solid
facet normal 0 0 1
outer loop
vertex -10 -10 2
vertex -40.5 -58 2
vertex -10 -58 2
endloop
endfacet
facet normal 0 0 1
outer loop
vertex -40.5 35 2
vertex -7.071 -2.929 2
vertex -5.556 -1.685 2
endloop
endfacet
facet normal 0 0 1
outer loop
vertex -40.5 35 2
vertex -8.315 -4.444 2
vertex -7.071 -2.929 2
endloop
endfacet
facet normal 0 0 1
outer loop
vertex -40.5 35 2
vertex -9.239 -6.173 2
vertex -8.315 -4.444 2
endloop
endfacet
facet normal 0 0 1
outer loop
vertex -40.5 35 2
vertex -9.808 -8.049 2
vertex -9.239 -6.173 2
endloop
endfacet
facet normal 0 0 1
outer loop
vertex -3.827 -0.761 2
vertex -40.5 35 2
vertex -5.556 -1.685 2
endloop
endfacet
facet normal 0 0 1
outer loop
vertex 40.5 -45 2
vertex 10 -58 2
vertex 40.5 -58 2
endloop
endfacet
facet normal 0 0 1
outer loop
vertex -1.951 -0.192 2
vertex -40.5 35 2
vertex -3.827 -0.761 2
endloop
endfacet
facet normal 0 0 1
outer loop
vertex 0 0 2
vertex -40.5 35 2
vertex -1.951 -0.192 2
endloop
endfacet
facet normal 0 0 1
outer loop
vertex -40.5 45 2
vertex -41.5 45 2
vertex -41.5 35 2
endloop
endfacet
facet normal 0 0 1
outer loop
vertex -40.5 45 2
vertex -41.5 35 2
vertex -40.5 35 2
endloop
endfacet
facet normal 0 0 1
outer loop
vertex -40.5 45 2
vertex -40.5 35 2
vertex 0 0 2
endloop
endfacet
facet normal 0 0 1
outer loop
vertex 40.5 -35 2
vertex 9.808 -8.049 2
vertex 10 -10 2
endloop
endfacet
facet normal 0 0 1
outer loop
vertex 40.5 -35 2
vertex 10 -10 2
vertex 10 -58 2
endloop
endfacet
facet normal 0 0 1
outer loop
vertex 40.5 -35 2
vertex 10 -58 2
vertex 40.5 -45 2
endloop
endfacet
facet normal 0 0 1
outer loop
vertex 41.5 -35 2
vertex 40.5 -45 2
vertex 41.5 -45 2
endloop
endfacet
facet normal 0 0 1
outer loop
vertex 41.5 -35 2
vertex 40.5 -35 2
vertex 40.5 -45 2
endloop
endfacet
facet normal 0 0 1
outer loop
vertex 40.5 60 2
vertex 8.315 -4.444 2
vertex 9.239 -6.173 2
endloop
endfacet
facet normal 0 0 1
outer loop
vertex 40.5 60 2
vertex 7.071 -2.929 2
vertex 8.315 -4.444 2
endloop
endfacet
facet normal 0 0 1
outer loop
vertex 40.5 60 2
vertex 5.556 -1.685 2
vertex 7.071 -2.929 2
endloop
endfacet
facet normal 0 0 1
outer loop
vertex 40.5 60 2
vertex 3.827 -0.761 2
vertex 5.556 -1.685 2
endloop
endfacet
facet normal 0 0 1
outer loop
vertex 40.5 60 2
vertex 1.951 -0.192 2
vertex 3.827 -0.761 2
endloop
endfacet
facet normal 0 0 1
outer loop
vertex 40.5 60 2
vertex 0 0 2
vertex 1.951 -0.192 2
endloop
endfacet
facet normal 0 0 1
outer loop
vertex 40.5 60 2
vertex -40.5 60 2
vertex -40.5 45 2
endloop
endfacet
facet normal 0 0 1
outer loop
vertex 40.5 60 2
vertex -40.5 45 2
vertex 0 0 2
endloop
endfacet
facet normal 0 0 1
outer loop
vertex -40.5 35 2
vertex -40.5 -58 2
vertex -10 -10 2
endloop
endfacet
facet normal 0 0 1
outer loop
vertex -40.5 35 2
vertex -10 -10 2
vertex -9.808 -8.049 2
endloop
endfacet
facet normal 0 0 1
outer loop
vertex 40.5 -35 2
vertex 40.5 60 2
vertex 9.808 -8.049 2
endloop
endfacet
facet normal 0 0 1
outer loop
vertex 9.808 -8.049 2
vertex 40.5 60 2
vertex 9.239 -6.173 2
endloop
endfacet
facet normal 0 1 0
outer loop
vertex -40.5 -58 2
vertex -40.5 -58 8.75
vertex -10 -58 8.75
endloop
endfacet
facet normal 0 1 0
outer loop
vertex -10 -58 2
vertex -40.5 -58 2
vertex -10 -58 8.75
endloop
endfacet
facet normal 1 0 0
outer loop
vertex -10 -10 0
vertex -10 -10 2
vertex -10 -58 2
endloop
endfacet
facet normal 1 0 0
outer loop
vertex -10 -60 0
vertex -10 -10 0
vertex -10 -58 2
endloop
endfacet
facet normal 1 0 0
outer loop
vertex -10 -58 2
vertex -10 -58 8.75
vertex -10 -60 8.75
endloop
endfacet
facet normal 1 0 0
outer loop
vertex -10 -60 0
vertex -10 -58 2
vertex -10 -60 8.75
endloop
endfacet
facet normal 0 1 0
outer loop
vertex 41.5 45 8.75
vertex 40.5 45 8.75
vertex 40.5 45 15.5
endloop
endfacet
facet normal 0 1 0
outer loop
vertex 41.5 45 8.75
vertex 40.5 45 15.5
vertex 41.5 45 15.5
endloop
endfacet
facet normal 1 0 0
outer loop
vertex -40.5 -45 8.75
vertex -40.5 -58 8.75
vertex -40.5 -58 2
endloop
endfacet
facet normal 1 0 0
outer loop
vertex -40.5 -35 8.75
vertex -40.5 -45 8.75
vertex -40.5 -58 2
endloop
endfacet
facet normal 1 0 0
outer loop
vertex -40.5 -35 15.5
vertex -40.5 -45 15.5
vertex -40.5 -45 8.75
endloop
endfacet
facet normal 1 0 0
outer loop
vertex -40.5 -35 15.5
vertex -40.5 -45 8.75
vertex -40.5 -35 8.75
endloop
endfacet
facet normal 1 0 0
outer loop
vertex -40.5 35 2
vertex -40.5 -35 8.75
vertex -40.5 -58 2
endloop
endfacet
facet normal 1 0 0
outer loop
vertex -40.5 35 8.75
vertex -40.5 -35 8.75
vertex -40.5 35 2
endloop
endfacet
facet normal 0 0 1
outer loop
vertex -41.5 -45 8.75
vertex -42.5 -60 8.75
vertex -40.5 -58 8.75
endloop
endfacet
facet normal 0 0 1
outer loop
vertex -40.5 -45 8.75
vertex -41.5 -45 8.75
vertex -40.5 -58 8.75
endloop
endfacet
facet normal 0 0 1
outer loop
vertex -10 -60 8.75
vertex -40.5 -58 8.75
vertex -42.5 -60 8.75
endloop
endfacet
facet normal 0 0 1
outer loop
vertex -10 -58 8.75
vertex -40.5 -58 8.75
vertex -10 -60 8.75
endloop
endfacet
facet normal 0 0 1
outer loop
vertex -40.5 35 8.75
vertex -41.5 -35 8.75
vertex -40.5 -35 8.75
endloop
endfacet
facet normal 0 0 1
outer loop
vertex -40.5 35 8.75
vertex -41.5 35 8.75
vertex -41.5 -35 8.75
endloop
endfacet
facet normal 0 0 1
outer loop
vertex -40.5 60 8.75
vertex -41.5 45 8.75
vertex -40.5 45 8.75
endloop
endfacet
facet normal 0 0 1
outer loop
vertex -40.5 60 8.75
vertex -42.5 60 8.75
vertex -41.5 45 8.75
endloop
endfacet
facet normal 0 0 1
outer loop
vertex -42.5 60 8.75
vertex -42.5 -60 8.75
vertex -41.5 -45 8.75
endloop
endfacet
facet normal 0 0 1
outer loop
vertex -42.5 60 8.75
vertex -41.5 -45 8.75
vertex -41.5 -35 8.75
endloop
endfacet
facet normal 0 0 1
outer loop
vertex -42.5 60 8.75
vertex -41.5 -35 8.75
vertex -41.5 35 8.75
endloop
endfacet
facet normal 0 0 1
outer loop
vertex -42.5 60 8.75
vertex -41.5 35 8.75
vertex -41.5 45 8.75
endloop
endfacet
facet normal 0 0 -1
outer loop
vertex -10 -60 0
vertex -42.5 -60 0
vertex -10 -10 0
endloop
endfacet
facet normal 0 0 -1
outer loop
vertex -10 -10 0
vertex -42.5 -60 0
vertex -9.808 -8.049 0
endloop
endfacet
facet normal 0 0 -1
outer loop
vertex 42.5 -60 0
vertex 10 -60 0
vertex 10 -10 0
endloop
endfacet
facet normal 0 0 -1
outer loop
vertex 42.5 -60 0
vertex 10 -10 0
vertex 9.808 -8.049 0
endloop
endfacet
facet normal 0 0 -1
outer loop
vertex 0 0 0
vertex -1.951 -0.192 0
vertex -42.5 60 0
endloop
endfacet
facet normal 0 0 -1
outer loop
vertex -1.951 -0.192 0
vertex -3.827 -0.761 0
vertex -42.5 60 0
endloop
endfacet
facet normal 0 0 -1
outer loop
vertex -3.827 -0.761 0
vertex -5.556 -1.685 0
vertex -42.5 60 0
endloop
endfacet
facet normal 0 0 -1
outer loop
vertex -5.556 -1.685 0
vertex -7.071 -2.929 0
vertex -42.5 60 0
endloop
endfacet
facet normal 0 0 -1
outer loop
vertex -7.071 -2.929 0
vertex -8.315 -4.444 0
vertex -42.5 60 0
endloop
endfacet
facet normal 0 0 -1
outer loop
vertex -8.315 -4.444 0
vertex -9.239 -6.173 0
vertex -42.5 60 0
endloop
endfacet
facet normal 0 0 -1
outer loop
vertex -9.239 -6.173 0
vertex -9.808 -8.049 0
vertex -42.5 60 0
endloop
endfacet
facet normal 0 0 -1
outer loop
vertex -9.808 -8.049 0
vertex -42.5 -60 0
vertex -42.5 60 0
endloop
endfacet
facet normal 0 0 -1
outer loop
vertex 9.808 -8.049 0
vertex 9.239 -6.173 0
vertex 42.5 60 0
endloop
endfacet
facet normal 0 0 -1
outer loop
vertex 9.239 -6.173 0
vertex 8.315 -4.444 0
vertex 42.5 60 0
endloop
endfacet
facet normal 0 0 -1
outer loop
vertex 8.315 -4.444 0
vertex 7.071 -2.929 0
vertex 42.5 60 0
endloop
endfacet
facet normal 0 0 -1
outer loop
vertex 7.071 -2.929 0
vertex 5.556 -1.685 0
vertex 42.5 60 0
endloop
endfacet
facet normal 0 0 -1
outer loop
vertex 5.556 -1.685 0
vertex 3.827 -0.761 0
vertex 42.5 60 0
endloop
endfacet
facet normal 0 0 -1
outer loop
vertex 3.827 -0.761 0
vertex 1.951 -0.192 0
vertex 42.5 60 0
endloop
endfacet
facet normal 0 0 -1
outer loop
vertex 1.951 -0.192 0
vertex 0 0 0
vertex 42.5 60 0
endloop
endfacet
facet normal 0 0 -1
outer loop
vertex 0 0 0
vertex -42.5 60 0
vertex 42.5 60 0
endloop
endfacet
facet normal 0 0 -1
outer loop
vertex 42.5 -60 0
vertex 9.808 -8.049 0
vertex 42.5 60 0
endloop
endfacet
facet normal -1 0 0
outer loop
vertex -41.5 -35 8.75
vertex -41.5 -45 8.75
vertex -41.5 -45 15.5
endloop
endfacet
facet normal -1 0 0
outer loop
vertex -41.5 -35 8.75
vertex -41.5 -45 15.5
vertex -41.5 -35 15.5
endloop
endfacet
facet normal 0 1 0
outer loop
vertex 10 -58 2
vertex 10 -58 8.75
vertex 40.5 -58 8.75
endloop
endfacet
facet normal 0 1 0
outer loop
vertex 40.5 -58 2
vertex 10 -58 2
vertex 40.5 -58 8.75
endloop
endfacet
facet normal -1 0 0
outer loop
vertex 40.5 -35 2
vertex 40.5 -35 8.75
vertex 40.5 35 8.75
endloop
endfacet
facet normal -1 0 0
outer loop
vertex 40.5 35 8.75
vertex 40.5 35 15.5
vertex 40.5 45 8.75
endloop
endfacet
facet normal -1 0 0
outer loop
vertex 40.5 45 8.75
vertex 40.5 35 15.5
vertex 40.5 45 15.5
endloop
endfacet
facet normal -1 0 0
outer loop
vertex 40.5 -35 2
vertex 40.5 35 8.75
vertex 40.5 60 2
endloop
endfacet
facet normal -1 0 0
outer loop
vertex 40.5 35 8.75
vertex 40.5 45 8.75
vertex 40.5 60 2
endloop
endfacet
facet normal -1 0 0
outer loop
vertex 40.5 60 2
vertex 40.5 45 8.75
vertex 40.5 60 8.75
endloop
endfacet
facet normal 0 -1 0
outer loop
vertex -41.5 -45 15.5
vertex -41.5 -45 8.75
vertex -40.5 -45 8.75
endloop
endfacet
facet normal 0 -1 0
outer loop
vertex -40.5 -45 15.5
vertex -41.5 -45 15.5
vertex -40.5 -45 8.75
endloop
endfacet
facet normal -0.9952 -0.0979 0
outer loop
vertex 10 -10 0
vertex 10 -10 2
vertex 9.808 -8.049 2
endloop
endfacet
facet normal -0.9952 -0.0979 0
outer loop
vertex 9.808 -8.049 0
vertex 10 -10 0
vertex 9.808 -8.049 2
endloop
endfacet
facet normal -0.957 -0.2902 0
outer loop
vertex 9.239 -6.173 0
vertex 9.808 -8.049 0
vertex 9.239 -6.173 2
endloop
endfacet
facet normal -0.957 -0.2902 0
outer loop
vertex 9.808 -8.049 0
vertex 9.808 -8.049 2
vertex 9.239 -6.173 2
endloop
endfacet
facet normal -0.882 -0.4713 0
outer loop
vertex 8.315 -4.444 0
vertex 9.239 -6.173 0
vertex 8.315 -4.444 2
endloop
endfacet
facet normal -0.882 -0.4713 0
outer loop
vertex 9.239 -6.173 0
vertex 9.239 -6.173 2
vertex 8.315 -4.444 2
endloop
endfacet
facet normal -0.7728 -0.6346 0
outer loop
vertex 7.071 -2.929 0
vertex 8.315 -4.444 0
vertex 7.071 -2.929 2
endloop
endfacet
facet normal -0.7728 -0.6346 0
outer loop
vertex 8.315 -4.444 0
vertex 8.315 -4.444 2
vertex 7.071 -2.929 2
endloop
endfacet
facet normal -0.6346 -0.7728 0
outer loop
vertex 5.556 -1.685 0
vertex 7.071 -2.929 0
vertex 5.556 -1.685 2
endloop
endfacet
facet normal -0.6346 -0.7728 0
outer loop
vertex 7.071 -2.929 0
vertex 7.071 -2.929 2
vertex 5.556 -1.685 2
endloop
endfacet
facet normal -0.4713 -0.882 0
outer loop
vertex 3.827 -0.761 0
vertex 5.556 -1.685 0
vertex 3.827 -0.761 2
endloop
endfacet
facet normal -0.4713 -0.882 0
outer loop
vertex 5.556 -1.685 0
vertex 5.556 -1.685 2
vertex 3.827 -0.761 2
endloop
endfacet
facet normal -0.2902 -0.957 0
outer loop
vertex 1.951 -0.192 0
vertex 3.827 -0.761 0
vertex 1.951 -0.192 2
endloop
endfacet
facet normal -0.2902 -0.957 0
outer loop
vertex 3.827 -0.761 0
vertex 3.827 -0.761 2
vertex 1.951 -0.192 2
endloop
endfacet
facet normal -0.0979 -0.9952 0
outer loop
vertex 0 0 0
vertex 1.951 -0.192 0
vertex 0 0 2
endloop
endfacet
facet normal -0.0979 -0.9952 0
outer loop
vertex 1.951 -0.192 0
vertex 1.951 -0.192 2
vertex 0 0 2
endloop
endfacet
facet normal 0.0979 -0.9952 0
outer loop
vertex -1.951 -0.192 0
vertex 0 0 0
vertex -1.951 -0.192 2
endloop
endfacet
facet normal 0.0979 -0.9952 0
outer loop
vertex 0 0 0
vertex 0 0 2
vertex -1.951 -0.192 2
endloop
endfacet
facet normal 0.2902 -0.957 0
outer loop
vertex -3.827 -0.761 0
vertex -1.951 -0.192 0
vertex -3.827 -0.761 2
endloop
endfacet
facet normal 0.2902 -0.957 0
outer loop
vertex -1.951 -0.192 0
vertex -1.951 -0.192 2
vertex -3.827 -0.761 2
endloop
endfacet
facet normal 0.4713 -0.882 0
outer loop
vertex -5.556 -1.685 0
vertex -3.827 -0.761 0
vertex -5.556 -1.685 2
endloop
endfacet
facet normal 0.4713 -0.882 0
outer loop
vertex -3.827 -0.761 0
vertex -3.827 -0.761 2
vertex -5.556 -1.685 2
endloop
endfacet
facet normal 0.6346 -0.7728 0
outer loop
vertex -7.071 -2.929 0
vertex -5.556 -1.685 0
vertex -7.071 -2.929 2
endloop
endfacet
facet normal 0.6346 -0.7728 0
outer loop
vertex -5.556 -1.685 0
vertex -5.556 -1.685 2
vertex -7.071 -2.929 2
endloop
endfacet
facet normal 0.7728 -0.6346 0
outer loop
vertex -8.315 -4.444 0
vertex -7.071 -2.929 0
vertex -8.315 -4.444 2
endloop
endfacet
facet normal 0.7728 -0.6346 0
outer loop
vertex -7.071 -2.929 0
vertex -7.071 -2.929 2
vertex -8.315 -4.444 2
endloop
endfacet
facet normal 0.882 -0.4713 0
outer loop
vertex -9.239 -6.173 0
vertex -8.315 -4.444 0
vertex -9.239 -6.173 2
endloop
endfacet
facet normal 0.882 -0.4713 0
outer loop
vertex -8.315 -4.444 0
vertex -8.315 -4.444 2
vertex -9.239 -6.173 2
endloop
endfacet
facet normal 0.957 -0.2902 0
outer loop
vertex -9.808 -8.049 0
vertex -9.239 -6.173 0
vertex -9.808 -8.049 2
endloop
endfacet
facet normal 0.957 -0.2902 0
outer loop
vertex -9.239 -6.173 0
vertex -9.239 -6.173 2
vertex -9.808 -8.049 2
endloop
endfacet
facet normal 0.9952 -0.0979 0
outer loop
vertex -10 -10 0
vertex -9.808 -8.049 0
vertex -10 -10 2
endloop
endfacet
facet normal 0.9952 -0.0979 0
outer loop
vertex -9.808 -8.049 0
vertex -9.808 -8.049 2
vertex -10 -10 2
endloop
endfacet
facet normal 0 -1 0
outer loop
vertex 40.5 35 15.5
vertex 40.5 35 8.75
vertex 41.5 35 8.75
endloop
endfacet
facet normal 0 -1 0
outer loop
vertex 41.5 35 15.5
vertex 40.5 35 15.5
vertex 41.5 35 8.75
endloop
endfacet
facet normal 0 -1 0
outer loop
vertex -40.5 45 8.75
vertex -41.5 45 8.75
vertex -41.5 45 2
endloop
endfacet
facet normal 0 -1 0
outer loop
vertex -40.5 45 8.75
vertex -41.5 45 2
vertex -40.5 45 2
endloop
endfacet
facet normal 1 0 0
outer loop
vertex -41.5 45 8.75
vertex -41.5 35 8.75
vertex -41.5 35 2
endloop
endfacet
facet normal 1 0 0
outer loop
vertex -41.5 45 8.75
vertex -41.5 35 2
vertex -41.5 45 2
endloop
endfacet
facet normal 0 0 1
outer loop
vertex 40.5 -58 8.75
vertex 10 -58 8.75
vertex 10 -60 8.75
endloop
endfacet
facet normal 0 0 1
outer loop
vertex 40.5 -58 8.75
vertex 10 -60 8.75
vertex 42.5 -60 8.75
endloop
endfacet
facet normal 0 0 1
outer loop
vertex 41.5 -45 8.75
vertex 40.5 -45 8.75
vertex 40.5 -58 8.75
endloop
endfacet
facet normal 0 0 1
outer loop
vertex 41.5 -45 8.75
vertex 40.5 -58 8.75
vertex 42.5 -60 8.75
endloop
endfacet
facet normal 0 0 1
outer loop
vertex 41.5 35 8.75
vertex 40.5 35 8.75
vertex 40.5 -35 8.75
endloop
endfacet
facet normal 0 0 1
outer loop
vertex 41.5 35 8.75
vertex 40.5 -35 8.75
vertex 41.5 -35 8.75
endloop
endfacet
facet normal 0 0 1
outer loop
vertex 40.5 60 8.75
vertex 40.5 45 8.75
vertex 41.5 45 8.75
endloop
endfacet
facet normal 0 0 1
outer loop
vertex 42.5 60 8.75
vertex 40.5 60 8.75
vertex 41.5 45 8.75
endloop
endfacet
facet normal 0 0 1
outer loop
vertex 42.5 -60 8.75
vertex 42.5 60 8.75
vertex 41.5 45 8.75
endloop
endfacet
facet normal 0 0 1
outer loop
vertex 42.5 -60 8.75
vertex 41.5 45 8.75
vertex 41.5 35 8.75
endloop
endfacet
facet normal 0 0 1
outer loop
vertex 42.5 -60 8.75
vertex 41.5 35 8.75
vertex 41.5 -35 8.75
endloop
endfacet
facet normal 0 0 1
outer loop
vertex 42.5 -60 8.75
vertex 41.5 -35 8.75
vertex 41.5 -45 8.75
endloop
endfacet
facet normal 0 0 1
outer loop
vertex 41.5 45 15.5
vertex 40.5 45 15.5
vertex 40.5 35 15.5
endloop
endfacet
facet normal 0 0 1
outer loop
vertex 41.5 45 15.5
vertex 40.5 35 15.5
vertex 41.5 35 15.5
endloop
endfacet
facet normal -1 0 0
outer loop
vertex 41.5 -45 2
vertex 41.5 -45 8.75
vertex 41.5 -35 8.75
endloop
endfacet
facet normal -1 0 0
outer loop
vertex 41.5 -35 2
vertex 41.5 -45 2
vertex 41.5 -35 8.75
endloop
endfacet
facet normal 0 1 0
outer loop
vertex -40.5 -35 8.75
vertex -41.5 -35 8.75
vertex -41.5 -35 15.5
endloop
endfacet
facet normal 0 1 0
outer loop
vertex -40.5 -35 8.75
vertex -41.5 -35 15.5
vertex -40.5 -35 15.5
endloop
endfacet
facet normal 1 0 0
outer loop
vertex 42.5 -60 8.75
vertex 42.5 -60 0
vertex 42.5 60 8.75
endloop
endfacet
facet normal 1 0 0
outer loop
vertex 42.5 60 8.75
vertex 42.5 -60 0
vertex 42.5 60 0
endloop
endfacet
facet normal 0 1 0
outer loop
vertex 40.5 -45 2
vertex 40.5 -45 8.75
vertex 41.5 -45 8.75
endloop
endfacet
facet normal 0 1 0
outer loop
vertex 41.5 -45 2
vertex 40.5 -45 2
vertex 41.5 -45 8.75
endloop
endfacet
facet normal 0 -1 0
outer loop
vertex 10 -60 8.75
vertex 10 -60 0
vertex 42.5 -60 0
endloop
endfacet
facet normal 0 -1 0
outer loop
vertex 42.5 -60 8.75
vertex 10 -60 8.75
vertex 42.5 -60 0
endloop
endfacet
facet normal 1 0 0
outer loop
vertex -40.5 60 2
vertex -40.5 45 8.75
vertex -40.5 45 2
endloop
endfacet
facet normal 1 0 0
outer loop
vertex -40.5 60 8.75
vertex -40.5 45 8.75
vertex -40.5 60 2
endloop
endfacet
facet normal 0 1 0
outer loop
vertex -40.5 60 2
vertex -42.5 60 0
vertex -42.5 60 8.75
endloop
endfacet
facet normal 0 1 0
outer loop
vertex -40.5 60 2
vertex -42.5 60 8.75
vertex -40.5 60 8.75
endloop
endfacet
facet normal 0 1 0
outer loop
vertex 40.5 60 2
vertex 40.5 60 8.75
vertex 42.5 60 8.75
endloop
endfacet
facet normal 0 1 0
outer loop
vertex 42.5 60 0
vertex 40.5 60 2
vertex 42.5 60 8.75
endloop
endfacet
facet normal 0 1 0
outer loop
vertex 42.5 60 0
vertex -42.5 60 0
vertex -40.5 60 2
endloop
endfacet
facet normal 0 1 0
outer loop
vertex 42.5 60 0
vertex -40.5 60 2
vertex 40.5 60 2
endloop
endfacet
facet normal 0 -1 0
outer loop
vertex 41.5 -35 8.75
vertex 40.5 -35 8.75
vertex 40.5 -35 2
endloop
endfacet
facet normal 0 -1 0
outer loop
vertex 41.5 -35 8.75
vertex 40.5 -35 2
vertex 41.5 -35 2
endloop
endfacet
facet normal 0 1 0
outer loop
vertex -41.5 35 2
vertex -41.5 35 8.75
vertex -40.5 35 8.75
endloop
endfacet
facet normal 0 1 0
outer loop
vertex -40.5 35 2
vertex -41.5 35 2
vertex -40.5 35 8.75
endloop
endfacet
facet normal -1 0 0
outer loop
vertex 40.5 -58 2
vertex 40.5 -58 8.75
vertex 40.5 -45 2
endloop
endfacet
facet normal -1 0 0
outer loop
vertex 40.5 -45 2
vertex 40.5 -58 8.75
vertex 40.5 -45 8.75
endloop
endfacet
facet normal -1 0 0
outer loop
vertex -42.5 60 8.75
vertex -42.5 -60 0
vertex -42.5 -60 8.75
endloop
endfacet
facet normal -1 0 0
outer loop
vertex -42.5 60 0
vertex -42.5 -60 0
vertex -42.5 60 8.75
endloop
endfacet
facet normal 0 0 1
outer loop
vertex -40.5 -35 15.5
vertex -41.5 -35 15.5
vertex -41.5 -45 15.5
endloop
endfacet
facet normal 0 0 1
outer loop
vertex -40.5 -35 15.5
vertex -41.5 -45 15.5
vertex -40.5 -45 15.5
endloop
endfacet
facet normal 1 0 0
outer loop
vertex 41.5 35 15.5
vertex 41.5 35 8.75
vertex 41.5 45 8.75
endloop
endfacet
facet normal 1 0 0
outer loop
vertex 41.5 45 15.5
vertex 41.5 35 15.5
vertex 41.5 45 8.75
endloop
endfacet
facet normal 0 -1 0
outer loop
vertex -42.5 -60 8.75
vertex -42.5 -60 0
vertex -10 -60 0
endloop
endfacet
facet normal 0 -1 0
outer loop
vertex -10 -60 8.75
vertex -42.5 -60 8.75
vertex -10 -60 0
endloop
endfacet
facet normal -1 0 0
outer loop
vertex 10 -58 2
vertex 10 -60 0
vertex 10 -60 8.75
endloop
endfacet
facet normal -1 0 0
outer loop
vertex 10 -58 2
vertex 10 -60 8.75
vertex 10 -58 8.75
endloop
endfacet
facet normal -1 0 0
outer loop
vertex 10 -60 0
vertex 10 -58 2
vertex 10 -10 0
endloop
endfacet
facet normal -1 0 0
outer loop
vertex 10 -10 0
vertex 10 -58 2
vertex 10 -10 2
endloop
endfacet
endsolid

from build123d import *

# Parameters (mm, degrees)
F0_W      = 85
F0_H      = 120
F1_DEPTH  = 8.75
F2_W      = 81
F2_H      = 118
F3_DEPTH  = 6.75
F5_DEPTH  = 25
F6_W      = 1
F6_H      = 10
F7_DEPTH  = 6.75
F8_W      = 1
F8_H      = 10
F9_DEPTH  = 6.75
F10_W     = 1
F10_H     = 10
F11_DEPTH = 6.75
F12_W     = 1
F12_H     = 10
F13_DEPTH = 6.75


with BuildPart() as f1:
    # F0 (on Top) → F1 (new body)
    with BuildSketch(Plane.XY):
        Rectangle(F0_W, F0_H)
    extrude(amount=F1_DEPTH)

    # F2 (on face) → F3 (cut)
    with BuildSketch(Plane.XY.offset(8.75)):
        with Locations((0, 1)):
            Rectangle(F2_W, F2_H)
    extrude(amount=-F3_DEPTH, mode=Mode.SUBTRACT)

    # F4 (on face) → F5 (cut)
    with BuildSketch(Plane.XY.offset(8.75)):
        with BuildLine():
            Line((-10, -10), (-10, -60))
            Line((-10, -60), (10, -60))
            Line((10, -60), (10, -10))
            ThreePointArc((10, -10), (0, 0), (-10, -10))
        make_face()
    extrude(amount=-F5_DEPTH, mode=Mode.SUBTRACT)

    # F6 (on face) → F7 (cut)
    with BuildSketch(Plane.XY.offset(8.75)):
        with Locations((-41, 40)):
            Rectangle(F6_W, F6_H)
    extrude(amount=-F7_DEPTH, mode=Mode.SUBTRACT)

    # F8 (on face) → F9 (cut)
    with BuildSketch(Plane.XY.offset(8.75)):
        with Locations((41, -40)):
            Rectangle(F8_W, F8_H)
    extrude(amount=-F9_DEPTH, mode=Mode.SUBTRACT)

    # F10 (on face) → F11 (join)
    with BuildSketch(Plane.XY.offset(8.75)):
        with Locations((-41, -40)):
            Rectangle(F10_W, F10_H)
    extrude(amount=F11_DEPTH)

    # F12 (on face) → F13 (join)
    with BuildSketch(Plane.XY.offset(8.75)):
        with Locations((41, 40)):
            Rectangle(F12_W, F12_H)
    extrude(amount=F13_DEPTH)


solid = f1.part
